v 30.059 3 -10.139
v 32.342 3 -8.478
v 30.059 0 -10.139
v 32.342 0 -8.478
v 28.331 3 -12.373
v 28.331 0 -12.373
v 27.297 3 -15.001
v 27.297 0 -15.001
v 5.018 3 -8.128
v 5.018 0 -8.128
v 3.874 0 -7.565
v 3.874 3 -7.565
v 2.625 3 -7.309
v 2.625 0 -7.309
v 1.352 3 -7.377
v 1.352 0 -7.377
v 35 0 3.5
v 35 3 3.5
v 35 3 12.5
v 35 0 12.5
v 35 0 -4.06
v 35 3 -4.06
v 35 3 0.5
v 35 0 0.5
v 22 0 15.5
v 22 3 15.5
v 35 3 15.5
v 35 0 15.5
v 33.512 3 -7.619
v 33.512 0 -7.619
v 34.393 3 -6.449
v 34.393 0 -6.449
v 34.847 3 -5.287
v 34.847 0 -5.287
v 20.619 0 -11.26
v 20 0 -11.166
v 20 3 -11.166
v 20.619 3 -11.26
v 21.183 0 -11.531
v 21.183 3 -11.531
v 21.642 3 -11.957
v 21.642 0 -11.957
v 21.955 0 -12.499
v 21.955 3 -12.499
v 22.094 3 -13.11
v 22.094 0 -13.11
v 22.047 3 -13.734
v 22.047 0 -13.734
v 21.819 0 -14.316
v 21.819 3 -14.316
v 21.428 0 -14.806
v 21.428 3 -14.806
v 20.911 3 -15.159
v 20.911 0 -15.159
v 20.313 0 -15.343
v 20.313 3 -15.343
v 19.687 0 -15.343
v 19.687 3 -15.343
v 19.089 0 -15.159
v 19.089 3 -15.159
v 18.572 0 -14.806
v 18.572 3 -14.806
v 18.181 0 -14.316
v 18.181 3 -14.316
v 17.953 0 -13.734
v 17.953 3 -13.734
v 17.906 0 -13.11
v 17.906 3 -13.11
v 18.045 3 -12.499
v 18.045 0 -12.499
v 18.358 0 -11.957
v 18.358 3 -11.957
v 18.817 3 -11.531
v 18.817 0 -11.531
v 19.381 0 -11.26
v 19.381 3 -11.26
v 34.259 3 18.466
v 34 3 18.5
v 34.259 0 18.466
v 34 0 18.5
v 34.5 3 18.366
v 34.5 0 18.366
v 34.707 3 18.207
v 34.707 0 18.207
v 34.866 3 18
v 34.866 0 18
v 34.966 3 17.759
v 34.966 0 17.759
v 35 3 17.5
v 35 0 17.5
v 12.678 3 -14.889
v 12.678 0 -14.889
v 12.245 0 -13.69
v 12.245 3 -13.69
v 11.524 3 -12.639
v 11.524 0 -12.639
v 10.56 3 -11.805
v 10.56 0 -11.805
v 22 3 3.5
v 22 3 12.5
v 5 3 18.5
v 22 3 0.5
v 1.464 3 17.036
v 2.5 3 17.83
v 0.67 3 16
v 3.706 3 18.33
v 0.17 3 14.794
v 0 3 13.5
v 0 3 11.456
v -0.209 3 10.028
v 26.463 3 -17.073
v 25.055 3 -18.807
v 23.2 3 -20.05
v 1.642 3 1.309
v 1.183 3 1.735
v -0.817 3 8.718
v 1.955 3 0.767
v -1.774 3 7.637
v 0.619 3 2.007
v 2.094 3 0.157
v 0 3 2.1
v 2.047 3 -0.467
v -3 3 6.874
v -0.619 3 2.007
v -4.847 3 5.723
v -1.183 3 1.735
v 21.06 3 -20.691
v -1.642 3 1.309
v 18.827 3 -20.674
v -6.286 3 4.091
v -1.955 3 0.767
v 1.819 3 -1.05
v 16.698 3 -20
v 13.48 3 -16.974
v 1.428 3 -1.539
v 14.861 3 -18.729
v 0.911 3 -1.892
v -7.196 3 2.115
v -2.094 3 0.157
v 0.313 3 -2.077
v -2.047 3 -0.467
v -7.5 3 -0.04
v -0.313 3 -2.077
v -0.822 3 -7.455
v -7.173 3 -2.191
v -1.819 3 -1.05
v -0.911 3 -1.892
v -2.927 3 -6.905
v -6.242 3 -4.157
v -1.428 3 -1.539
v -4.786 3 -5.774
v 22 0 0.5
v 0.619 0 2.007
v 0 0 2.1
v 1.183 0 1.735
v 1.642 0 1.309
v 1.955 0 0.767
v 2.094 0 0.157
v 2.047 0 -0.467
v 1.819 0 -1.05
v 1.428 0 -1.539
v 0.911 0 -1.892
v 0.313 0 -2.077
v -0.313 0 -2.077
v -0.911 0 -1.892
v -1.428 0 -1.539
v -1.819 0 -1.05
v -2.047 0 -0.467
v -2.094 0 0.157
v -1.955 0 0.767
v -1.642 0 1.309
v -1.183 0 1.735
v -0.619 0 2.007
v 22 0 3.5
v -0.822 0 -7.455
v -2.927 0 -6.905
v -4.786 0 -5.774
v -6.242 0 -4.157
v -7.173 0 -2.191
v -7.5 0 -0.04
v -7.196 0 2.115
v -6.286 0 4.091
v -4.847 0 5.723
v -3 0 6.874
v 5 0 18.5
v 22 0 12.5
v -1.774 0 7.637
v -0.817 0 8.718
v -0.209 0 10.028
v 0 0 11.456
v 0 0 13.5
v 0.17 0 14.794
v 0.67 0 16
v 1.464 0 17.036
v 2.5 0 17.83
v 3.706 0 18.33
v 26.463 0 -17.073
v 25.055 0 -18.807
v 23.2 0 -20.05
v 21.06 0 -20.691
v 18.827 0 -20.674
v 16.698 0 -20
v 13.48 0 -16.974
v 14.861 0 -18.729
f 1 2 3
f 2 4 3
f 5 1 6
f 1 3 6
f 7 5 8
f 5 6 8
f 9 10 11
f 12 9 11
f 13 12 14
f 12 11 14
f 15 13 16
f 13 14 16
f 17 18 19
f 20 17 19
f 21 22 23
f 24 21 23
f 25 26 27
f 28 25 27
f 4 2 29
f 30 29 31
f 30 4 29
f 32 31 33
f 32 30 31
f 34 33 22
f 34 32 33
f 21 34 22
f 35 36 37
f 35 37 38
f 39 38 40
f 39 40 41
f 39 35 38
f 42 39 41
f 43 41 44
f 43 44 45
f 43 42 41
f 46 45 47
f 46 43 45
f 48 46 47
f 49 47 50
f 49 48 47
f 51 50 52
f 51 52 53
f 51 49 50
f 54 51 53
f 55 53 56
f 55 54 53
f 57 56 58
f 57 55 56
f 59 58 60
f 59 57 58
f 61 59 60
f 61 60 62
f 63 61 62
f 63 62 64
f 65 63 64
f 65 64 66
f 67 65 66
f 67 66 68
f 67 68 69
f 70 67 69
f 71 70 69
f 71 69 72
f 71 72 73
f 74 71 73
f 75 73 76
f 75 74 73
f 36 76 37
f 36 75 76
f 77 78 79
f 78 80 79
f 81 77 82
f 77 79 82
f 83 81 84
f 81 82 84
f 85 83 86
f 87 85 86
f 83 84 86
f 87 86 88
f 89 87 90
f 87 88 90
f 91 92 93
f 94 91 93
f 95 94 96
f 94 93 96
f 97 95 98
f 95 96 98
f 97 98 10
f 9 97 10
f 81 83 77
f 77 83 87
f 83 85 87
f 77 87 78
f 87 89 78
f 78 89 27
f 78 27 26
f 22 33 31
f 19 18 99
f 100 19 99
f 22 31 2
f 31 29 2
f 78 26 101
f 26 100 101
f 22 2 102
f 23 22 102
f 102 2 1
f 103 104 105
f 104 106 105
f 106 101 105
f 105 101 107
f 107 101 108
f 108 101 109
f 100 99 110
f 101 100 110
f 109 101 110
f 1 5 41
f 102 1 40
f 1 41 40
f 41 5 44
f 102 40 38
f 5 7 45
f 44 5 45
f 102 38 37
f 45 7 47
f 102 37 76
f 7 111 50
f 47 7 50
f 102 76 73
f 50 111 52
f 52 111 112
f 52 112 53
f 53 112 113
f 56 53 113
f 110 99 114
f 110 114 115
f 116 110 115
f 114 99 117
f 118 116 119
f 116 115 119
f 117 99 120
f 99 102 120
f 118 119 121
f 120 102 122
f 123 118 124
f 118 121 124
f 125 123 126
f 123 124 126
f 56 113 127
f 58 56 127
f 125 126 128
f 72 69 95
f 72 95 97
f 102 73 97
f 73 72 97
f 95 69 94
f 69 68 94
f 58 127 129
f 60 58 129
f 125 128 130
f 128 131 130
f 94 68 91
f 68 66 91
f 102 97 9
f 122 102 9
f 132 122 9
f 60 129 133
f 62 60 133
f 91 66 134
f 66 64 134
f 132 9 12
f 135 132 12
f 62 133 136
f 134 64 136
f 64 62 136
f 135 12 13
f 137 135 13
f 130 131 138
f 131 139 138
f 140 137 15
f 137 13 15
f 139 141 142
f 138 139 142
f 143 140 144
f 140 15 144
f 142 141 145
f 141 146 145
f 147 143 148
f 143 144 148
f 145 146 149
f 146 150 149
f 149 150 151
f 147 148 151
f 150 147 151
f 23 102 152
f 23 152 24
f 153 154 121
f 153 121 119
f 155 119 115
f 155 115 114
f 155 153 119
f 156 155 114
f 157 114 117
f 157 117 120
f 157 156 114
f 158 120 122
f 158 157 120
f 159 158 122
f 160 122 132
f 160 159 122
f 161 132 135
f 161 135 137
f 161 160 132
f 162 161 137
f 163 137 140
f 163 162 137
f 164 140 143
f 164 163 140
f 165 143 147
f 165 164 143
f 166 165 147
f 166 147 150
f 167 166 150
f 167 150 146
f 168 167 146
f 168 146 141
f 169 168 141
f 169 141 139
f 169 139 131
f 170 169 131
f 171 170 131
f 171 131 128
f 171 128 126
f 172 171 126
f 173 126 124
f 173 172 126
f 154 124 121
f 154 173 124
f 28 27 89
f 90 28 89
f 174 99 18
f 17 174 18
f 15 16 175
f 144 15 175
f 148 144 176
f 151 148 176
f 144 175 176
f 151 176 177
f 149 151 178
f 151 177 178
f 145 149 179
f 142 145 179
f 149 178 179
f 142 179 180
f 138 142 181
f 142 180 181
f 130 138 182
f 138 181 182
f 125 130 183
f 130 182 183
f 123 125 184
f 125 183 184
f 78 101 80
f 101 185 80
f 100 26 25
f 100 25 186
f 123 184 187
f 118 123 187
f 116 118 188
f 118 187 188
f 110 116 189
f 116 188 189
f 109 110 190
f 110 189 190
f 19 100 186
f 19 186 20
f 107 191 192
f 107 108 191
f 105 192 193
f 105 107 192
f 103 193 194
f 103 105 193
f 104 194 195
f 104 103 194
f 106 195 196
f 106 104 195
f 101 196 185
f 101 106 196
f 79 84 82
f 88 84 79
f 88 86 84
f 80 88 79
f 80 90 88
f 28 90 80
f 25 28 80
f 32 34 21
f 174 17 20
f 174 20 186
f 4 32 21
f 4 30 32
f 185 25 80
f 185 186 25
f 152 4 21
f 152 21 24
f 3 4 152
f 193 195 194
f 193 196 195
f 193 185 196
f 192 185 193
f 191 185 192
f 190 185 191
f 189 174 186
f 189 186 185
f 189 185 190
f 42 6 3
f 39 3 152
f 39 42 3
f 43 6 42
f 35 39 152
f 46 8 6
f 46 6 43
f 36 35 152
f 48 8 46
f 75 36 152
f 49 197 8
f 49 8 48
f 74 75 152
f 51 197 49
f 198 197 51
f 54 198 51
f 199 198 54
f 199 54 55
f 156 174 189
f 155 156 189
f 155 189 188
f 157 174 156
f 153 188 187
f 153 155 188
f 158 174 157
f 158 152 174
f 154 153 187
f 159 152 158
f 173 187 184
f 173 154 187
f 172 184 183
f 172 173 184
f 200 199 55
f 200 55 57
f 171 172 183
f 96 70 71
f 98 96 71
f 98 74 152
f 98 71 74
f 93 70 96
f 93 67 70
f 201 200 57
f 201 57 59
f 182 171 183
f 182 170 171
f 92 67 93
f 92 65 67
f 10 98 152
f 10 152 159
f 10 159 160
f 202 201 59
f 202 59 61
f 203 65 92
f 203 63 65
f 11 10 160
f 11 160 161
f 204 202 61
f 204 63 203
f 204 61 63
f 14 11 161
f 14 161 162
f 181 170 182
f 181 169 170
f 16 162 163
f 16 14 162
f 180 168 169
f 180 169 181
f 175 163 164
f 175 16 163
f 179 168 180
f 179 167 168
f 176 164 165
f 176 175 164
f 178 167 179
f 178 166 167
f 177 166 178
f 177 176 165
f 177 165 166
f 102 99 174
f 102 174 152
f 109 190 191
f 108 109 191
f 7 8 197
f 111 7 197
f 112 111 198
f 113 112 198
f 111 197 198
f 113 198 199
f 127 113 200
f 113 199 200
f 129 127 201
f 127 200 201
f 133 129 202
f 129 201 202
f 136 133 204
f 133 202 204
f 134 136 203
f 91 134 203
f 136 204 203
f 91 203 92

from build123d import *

# Parameters (mm, degrees)
SKETCH1_R           = 2.1
BOSS_EXTRUDE1_DEPTH = 3
FILLET1_R           = 5
SKETCH2_W           = 8
SKETCH2_H           = 3
CUT_EXTRUDE1_DEPTH  = 3
BOSS_EXTRUDE2_DEPTH = 3
FILLET2_R           = 10
SKETCH5_W           = 13
SKETCH5_H           = 3
CUT_EXTRUDE3_DEPTH  = 3.5
FILLET3_R           = 5
FILLET4_R           = 1


with BuildPart() as part:
    # Sketch1 → Boss-Extrude1 (new body)
    with BuildSketch(Plane(origin=(0, 0, 0), x_dir=(1, 0, 0), z_dir=(0, 1, 0))):
        with BuildLine():
            Line((0, -11.456439237), (0, -18.5))
            Line((0, -18.5), (30, -18.5))
            Line((30, -18.5), (30, -10.955880937))
            ThreePointArc((30, -10.955880937), (29.758770483, -9.587800364), (29.064177772, -8.384730498))
            Line((29.064177772, -8.384730498), (22.591994863, -0.671483264))
            ThreePointArc((22.591994863, -0.671483264), (21.491397009, 3.371317526), (23.853330247, 6.832072535))
            ThreePointArc((23.853330247, 6.832072535), (24.386195315, 19.350189707), (12.677699795, 14.889434685))
            ThreePointArc((12.677699795, 14.889434685), (11.918282987, 13.141523465), (10.560020318, 11.804725034))
            Line((10.560020318, 11.804725034), (5.017813295, 8.128440794))
            ThreePointArc((5.017813295, 8.128440794), (3.258028142, 7.396960283), (1.352375582, 7.377064476))
            ThreePointArc((1.352375582, 7.377064476), (-7.172928544, 2.190683933), (-3, -6.873863542))
            ThreePointArc((-3, -6.873863542), (-0.816699867, -8.71782645), (0, -11.456439237))
        make_face()
        with Locations(Location((0, 0, 0), (0, 0, 270))):
            Circle(SKETCH1_R, mode=Mode.SUBTRACT)
        with Locations(Location((20, 13.266499161, 0), (0, 0, 270))):
            Circle(SKETCH1_R, mode=Mode.SUBTRACT)
    extrude(amount=BOSS_EXTRUDE1_DEPTH)

    # Fillet1
    fillet1_edges = [part.edges().sort_by_distance(p)[0] for p in [
        (0, 1.5, 18.5),
    ]]
    fillet(fillet1_edges, radius=FILLET1_R)

    # Sketch2 → Cut-Extrude1 (cut)
    with BuildSketch(Plane(origin=(0, 3, 0), x_dir=(1, 0, 0), z_dir=(0, 1, 0))):
        with Locations((26, -14)):
            Rectangle(SKETCH2_W, SKETCH2_H)
    extrude(amount=-CUT_EXTRUDE1_DEPTH, mode=Mode.SUBTRACT)

    # Sketch4 → Boss-Extrude2 (add)
    with BuildSketch(Plane(origin=(0, 3, 0), x_dir=(1, 0, 0), z_dir=(0, 1, 0))):
        Polygon((27.12691506, 10.930459408), (35, 7.210028784), (35, -0.5), (22, -0.5), (22, -3.5), (35, -3.5), (35, -12.5), (22, -12.5), (22, -15.5), (35, -15.5), (35, -18.5), (18.101899038, -18.5), (15.526805317, 5.265582811), align=None)
    extrude(amount=-BOSS_EXTRUDE2_DEPTH)

    # Fillet2
    fillet2_edges = [part.edges().sort_by_distance(p)[0] for p in [
        (27.12691506, 1.5, -10.930459408),
    ]]
    fillet(fillet2_edges, radius=FILLET2_R)

    # Sketch5 → Cut-Extrude3 (cut)
    with BuildSketch(Plane(origin=(0, 3, 0), x_dir=(1, 0, 0), z_dir=(0, 1, 0))):
        with Locations((28.5, -2)):
            Rectangle(SKETCH5_W, SKETCH5_H)
    extrude(amount=-CUT_EXTRUDE3_DEPTH, mode=Mode.SUBTRACT)

    # Fillet3
    fillet3_edges = [part.edges().sort_by_distance(p)[0] for p in [
        (35, 1.5, -7.210028784),
    ]]
    fillet(fillet3_edges, radius=FILLET3_R)

    # Fillet4
    fillet4_edges = [part.edges().sort_by_distance(p)[0] for p in [
        (35, 1.5, 18.5),
    ]]
    fillet(fillet4_edges, radius=FILLET4_R)


solid = part.part
